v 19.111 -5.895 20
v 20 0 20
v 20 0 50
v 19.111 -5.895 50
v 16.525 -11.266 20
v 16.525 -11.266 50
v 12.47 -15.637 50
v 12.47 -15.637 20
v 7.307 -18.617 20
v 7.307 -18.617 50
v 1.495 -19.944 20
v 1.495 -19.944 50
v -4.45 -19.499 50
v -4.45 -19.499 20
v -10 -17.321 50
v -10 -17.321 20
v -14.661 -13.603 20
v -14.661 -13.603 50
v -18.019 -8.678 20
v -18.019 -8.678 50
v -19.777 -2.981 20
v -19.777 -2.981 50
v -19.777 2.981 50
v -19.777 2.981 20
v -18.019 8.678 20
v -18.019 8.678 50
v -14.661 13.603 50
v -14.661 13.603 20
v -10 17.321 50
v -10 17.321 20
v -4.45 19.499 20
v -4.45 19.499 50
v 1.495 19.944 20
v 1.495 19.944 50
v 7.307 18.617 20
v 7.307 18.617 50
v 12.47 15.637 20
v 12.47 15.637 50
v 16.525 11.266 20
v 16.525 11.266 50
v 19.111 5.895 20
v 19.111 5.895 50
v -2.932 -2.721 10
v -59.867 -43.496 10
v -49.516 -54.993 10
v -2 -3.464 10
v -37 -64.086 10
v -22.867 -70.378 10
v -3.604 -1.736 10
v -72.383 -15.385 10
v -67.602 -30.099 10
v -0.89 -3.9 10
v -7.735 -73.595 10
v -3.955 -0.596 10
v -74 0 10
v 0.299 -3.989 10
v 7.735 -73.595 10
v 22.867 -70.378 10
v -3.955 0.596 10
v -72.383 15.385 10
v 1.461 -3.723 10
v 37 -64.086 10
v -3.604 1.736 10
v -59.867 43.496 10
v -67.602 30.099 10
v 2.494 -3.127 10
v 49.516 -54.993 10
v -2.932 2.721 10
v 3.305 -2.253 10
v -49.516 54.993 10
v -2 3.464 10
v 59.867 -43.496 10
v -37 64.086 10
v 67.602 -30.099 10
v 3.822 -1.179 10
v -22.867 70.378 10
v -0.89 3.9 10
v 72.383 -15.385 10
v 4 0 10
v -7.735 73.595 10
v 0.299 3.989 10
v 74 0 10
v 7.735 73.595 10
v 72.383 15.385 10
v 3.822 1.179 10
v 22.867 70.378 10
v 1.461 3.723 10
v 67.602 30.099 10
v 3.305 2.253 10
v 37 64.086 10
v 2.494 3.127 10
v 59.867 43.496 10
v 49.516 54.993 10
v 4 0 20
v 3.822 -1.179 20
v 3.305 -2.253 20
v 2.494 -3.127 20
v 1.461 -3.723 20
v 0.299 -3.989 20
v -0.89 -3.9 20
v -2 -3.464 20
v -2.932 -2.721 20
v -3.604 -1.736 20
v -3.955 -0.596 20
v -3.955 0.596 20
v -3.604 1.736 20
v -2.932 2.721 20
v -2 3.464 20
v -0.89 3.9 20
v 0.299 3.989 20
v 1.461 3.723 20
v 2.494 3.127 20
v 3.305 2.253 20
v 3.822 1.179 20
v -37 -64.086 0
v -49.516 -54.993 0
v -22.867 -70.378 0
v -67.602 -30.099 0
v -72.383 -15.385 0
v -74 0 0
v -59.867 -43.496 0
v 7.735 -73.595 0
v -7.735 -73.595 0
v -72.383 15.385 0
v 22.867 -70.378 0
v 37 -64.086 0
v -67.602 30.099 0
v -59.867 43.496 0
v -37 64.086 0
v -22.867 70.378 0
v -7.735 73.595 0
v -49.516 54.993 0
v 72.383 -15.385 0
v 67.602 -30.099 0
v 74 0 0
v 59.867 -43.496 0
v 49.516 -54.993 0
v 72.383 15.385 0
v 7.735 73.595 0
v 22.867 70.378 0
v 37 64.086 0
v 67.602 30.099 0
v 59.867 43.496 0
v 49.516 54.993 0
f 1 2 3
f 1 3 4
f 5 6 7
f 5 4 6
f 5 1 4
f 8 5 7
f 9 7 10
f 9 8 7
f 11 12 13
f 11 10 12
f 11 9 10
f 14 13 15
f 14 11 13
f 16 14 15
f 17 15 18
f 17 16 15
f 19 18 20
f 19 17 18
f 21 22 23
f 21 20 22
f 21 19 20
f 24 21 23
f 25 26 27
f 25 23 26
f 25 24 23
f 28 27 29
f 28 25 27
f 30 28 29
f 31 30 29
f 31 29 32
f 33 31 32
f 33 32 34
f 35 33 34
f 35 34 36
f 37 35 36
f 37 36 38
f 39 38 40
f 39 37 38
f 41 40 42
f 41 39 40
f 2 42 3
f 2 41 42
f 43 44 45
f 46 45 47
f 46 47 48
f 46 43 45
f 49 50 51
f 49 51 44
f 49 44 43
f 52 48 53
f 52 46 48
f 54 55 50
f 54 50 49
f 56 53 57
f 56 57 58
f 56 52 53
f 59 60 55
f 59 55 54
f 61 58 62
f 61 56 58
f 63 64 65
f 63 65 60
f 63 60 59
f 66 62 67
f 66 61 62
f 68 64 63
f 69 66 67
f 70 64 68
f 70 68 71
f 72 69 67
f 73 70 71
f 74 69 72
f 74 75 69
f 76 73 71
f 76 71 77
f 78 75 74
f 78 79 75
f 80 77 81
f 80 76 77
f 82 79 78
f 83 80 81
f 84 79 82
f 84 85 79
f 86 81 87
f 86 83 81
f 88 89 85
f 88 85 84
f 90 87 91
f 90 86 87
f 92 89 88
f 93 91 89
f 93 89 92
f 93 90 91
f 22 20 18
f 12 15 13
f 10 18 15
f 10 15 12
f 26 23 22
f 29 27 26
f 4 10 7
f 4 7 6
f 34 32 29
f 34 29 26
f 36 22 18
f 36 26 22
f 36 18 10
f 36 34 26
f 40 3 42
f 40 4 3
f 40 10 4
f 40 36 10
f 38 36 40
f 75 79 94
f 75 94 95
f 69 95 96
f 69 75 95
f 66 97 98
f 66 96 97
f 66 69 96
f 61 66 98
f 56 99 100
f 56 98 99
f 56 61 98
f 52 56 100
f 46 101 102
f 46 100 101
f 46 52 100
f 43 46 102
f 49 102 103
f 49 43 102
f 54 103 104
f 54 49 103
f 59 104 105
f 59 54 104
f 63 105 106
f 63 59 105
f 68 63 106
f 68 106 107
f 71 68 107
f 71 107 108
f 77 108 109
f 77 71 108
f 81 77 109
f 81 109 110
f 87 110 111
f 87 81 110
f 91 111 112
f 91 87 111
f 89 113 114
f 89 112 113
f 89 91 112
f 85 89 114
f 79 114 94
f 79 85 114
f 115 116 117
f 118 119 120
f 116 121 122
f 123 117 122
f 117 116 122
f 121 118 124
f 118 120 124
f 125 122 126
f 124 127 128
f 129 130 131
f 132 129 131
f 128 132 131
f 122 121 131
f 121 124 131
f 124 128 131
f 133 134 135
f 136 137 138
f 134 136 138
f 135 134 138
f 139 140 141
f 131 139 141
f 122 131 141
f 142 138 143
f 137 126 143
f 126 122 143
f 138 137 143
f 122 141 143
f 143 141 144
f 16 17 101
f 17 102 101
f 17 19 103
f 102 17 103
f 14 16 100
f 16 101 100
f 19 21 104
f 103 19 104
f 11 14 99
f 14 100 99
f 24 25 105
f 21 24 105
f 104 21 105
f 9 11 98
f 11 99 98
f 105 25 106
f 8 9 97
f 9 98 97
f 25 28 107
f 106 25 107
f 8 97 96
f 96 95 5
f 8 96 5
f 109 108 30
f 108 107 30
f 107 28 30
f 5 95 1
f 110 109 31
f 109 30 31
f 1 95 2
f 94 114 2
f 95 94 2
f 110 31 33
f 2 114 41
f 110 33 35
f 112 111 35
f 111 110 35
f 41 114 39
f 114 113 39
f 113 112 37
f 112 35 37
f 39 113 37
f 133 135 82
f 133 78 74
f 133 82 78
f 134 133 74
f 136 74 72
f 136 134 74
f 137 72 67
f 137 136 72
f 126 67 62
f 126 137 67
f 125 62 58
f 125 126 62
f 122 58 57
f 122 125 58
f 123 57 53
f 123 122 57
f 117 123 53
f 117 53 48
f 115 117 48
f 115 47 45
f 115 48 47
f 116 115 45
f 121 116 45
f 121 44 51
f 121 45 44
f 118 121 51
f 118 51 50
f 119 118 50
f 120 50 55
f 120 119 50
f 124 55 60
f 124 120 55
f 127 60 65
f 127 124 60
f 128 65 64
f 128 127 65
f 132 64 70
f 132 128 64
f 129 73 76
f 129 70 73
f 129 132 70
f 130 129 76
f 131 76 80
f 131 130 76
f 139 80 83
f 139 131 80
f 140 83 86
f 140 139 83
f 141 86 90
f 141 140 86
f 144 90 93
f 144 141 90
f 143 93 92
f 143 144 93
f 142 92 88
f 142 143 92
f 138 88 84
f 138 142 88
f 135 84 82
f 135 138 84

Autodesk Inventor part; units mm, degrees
ref_plane "YZ Plane" through (0, 0, 0) normal (1, 0, 0) x (0, 1, 0)
ref_plane "XZ Plane" through (0, 0, 0) normal (0, 1, 0) x (-1, 0, 0)
ref_plane "XY Plane" through (0, 0, 0) normal (0, 0, 1) x (1, 0, 0)
sketch "Sketch1" plane through (0, 0, 0) normal (0, 0, 1) x (1, 0, 0)
  circle A0 centre (0, 0) radius 74
extrude "Extrusion1" add sketch "Sketch1" along normal blind 10
sketch "Sketch2" plane through (0, 0, 10) normal (0, 0, 1) x (1, 0, 0)
  circle A0 centre (0, 0) radius 4
  dimension "d3" = 8
extrude "Extrusion2" add sketch "Sketch2" along normal blind 10
sketch "Sketch3" plane through (0, 0, 20) normal (0, 0, 1) x (1, 0, 0)
  circle A0 centre (0, 0) radius 4 projected
  circle A1 centre (0, 0) radius 20
  dimension "d6" = 40
extrude "Extrusion3" add sketch "Sketch3" along normal blind 30 contours A0 | A1
properties part number "Project_Rough_disc"
